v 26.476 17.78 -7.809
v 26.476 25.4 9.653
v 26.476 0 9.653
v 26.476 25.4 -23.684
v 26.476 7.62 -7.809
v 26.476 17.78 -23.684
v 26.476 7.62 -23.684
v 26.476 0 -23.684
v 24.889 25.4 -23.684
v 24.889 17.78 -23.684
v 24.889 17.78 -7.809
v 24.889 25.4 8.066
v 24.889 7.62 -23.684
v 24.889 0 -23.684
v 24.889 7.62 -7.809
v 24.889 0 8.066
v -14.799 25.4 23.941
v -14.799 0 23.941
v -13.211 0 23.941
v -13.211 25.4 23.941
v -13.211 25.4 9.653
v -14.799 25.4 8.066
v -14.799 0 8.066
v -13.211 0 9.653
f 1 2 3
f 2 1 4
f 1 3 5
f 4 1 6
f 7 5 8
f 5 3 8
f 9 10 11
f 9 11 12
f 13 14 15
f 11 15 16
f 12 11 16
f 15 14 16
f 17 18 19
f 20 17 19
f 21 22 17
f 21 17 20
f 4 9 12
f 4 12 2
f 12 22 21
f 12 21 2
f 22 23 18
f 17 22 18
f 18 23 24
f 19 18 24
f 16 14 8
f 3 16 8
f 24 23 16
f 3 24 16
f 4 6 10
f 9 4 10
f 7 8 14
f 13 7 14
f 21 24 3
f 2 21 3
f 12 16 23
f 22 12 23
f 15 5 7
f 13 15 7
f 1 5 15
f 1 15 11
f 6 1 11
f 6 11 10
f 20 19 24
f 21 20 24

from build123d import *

# Parameters (mm, degrees)
SKETCH1_W           = 38.1
SKETCH1_H           = 1.5875
BOSS_EXTRUDE1_DEPTH = 25.4
SKETCH2_W           = 15.875
SKETCH2_H           = 10.16
CUT_EXTRUDE1_DEPTH  = 25.4


with BuildPart() as part:
    # Sketch1 → Boss-Extrude1 (new body)
    with BuildSketch(Plane(origin=(0, 0, 0), x_dir=(1, 0, 0), z_dir=(0, 1, 0))):
        Polygon((26.476413323, 23.684114825), (24.888913323, 23.684114825), (24.888913323, -8.065885175), (24.888913323, -9.653385175), (26.476413323, -9.653385175), align=None)
        with Locations((5.838913323, -8.859635175)):
            Rectangle(SKETCH1_W, SKETCH1_H)
        Polygon((-13.211086677, -9.653385175), (-13.211086677, -8.065885175), (-14.798586677, -8.065885175), (-14.798586677, -23.940885175), (-13.211086677, -23.940885175), align=None)
    extrude(amount=BOSS_EXTRUDE1_DEPTH)

    # Sketch2 → Cut-Extrude1 (cut)
    with BuildSketch(Plane(origin=(26.476413323, 0, 0), x_dir=(0, 0, -1), z_dir=(1, 0, 0))):
        with Locations((15.746614825, 12.7)):
            Rectangle(SKETCH2_W, SKETCH2_H)
    extrude(amount=-CUT_EXTRUDE1_DEPTH, mode=Mode.SUBTRACT)


solid = part.part
